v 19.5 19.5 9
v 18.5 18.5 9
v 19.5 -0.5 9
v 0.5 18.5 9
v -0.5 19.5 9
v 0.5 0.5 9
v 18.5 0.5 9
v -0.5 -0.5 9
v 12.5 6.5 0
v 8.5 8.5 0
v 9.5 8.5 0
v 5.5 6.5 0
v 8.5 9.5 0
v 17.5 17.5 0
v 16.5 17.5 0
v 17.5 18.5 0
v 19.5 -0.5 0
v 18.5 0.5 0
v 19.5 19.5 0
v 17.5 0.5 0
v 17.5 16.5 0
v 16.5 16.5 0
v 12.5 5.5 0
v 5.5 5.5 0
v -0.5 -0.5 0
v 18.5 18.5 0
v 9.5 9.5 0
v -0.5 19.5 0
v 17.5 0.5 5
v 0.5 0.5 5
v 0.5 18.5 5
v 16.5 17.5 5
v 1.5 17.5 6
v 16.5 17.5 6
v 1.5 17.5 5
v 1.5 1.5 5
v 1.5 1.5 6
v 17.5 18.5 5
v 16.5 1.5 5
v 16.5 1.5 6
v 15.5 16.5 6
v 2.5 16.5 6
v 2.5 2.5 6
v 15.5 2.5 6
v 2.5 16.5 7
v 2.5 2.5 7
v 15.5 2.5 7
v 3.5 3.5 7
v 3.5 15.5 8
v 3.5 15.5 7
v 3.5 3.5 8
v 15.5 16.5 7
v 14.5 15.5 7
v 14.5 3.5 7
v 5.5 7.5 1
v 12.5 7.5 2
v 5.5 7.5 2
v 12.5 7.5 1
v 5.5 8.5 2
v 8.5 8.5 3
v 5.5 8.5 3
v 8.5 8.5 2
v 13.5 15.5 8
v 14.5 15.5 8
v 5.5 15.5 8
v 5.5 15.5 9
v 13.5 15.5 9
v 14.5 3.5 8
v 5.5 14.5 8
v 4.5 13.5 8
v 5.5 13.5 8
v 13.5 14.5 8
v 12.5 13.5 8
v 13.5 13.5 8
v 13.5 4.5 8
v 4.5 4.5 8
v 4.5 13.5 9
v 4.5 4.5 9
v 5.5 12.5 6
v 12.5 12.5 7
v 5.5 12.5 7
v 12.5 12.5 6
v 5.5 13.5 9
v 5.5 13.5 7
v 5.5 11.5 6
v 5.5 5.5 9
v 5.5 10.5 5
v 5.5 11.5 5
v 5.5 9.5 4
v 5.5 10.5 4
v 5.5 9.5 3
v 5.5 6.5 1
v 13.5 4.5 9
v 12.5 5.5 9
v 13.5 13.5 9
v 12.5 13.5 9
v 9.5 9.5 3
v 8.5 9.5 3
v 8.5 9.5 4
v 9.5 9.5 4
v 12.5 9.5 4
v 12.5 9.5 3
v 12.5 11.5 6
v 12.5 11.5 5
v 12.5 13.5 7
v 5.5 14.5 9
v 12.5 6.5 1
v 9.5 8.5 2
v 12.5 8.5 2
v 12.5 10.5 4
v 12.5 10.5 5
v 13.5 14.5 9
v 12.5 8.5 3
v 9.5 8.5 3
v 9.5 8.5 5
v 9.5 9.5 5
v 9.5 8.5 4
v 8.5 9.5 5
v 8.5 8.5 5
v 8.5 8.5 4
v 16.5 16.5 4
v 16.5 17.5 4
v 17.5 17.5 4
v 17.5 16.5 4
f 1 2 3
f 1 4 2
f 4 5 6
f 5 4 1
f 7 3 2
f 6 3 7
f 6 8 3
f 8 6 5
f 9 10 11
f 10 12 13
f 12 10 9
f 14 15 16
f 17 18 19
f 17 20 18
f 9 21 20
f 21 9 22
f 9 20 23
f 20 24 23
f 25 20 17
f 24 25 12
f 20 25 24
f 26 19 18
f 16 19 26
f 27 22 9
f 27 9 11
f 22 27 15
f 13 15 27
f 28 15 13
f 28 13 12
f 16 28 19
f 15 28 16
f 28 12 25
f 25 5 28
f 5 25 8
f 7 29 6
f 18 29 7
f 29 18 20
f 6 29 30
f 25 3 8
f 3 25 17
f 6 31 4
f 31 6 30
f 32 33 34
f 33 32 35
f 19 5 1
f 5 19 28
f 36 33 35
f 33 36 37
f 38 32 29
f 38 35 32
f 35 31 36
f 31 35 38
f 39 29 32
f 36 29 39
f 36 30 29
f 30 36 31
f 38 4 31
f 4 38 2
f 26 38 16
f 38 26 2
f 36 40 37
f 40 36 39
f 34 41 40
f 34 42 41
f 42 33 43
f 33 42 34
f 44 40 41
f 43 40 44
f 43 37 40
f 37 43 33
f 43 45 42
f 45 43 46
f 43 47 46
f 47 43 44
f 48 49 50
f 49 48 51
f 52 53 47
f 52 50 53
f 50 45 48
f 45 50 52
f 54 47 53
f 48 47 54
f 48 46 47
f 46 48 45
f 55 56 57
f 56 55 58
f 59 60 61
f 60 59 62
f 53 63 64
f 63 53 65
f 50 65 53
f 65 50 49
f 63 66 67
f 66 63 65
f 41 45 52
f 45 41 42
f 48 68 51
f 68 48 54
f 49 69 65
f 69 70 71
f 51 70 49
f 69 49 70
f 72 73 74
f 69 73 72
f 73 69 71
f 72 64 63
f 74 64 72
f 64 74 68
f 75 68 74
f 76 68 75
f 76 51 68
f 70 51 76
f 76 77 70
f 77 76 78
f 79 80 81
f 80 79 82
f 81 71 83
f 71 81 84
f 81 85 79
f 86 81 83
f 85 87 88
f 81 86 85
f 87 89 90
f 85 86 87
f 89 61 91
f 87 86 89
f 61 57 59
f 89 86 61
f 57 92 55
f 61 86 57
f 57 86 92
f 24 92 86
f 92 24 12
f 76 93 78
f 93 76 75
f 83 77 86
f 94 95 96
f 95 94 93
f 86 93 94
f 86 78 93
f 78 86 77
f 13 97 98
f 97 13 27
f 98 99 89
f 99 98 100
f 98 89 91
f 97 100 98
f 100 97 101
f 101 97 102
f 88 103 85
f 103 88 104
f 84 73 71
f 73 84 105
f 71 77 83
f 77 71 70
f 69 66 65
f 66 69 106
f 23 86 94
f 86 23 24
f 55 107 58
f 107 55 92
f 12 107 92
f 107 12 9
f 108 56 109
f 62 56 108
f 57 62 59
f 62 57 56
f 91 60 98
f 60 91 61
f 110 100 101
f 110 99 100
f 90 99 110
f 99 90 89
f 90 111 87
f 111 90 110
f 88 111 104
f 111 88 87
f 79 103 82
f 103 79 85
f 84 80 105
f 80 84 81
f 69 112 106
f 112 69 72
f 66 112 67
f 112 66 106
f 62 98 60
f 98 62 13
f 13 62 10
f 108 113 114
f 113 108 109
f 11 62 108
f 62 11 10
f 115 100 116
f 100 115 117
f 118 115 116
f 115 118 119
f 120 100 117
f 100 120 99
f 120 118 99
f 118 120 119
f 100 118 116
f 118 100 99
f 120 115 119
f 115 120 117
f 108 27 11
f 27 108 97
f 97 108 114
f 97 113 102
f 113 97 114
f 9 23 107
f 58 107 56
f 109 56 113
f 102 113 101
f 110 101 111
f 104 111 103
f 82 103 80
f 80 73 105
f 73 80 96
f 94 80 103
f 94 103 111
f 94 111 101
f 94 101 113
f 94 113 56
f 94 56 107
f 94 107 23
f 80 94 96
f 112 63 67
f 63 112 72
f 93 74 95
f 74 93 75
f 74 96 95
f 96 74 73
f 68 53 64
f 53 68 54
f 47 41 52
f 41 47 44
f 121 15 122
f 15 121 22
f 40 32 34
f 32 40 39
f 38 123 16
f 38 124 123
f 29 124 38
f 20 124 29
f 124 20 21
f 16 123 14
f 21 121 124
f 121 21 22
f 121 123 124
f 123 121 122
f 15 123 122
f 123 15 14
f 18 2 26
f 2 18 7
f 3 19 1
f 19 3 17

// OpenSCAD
union() {
    translate([0, 0, 4.5]) cube([1, 1, 9], center=true);
    translate([0, 1, 4.5]) cube([1, 1, 9], center=true);
    translate([0, 2, 4.5]) cube([1, 1, 9], center=true);
    translate([0, 3, 4.5]) cube([1, 1, 9], center=true);
    translate([0, 4, 4.5]) cube([1, 1, 9], center=true);
    translate([0, 5, 4.5]) cube([1, 1, 9], center=true);
    translate([0, 6, 4.5]) cube([1, 1, 9], center=true);
    translate([0, 7, 4.5]) cube([1, 1, 9], center=true);
    translate([0, 8, 4.5]) cube([1, 1, 9], center=true);
    translate([0, 9, 4.5]) cube([1, 1, 9], center=true);
    translate([0, 10, 4.5]) cube([1, 1, 9], center=true);
    translate([0, 11, 4.5]) cube([1, 1, 9], center=true);
    translate([0, 12, 4.5]) cube([1, 1, 9], center=true);
    translate([0, 13, 4.5]) cube([1, 1, 9], center=true);
    translate([0, 14, 4.5]) cube([1, 1, 9], center=true);
    translate([0, 15, 4.5]) cube([1, 1, 9], center=true);
    translate([0, 16, 4.5]) cube([1, 1, 9], center=true);
    translate([0, 17, 4.5]) cube([1, 1, 9], center=true);
    translate([0, 18, 4.5]) cube([1, 1, 9], center=true);
    translate([0, 19, 4.5]) cube([1, 1, 9], center=true);
    translate([1, 0, 4.5]) cube([1, 1, 9], center=true);
    translate([1, 1, 2.5]) cube([1, 1, 5], center=true);
    translate([1, 2, 2.5]) cube([1, 1, 5], center=true);
    translate([1, 3, 2.5]) cube([1, 1, 5], center=true);
    translate([1, 4, 2.5]) cube([1, 1, 5], center=true);
    translate([1, 5, 2.5]) cube([1, 1, 5], center=true);
    translate([1, 6, 2.5]) cube([1, 1, 5], center=true);
    translate([1, 7, 2.5]) cube([1, 1, 5], center=true);
    translate([1, 8, 2.5]) cube([1, 1, 5], center=true);
    translate([1, 9, 2.5]) cube([1, 1, 5], center=true);
    translate([1, 10, 2.5]) cube([1, 1, 5], center=true);
    translate([1, 11, 2.5]) cube([1, 1, 5], center=true);
    translate([1, 12, 2.5]) cube([1, 1, 5], center=true);
    translate([1, 13, 2.5]) cube([1, 1, 5], center=true);
    translate([1, 14, 2.5]) cube([1, 1, 5], center=true);
    translate([1, 15, 2.5]) cube([1, 1, 5], center=true);
    translate([1, 16, 2.5]) cube([1, 1, 5], center=true);
    translate([1, 17, 2.5]) cube([1, 1, 5], center=true);
    translate([1, 18, 2.5]) cube([1, 1, 5], center=true);
    translate([1, 19, 4.5]) cube([1, 1, 9], center=true);
    translate([2, 0, 4.5]) cube([1, 1, 9], center=true);
    translate([2, 1, 2.5]) cube([1, 1, 5], center=true);
    translate([2, 2, 3.0]) cube([1, 1, 6], center=true);
    translate([2, 3, 3.0]) cube([1, 1, 6], center=true);
    translate([2, 4, 3.0]) cube([1, 1, 6], center=true);
    translate([2, 5, 3.0]) cube([1, 1, 6], center=true);
    translate([2, 6, 3.0]) cube([1, 1, 6], center=true);
    translate([2, 7, 3.0]) cube([1, 1, 6], center=true);
    translate([2, 8, 3.0]) cube([1, 1, 6], center=true);
    translate([2, 9, 3.0]) cube([1, 1, 6], center=true);
    translate([2, 10, 3.0]) cube([1, 1, 6], center=true);
    translate([2, 11, 3.0]) cube([1, 1, 6], center=true);
    translate([2, 12, 3.0]) cube([1, 1, 6], center=true);
    translate([2, 13, 3.0]) cube([1, 1, 6], center=true);
    translate([2, 14, 3.0]) cube([1, 1, 6], center=true);
    translate([2, 15, 3.0]) cube([1, 1, 6], center=true);
    translate([2, 16, 3.0]) cube([1, 1, 6], center=true);
    translate([2, 17, 3.0]) cube([1, 1, 6], center=true);
    translate([2, 18, 2.5]) cube([1, 1, 5], center=true);
    translate([2, 19, 4.5]) cube([1, 1, 9], center=true);
    translate([3, 0, 4.5]) cube([1, 1, 9], center=true);
    translate([3, 1, 2.5]) cube([1, 1, 5], center=true);
    translate([3, 2, 3.0]) cube([1, 1, 6], center=true);
    translate([3, 3, 3.5]) cube([1, 1, 7], center=true);
    translate([3, 4, 3.5]) cube([1, 1, 7], center=true);
    translate([3, 5, 3.5]) cube([1, 1, 7], center=true);
    translate([3, 6, 3.5]) cube([1, 1, 7], center=true);
    translate([3, 7, 3.5]) cube([1, 1, 7], center=true);
    translate([3, 8, 3.5]) cube([1, 1, 7], center=true);
    translate([3, 9, 3.5]) cube([1, 1, 7], center=true);
    translate([3, 10, 3.5]) cube([1, 1, 7], center=true);
    translate([3, 11, 3.5]) cube([1, 1, 7], center=true);
    translate([3, 12, 3.5]) cube([1, 1, 7], center=true);
    translate([3, 13, 3.5]) cube([1, 1, 7], center=true);
    translate([3, 14, 3.5]) cube([1, 1, 7], center=true);
    translate([3, 15, 3.5]) cube([1, 1, 7], center=true);
    translate([3, 16, 3.5]) cube([1, 1, 7], center=true);
    translate([3, 17, 3.0]) cube([1, 1, 6], center=true);
    translate([3, 18, 2.5]) cube([1, 1, 5], center=true);
    translate([3, 19, 4.5]) cube([1, 1, 9], center=true);
    translate([4, 0, 4.5]) cube([1, 1, 9], center=true);
    translate([4, 1, 2.5]) cube([1, 1, 5], center=true);
    translate([4, 2, 3.0]) cube([1, 1, 6], center=true);
    translate([4, 3, 3.5]) cube([1, 1, 7], center=true);
    translate([4, 4, 4.0]) cube([1, 1, 8], center=true);
    translate([4, 5, 4.0]) cube([1, 1, 8], center=true);
    translate([4, 6, 4.0]) cube([1, 1, 8], center=true);
    translate([4, 7, 4.0]) cube([1, 1, 8], center=true);
    translate([4, 8, 4.0]) cube([1, 1, 8], center=true);
    translate([4, 9, 4.0]) cube([1, 1, 8], center=true);
    translate([4, 10, 4.0]) cube([1, 1, 8], center=true);
    translate([4, 11, 4.0]) cube([1, 1, 8], center=true);
    translate([4, 12, 4.0]) cube([1, 1, 8], center=true);
    translate([4, 13, 4.0]) cube([1, 1, 8], center=true);
    translate([4, 14, 4.0]) cube([1, 1, 8], center=true);
    translate([4, 15, 4.0]) cube([1, 1, 8], center=true);
    translate([4, 16, 3.5]) cube([1, 1, 7], center=true);
    translate([4, 17, 3.0]) cube([1, 1, 6], center=true);
    translate([4, 18, 2.5]) cube([1, 1, 5], center=true);
    translate([4, 19, 4.5]) cube([1, 1, 9], center=true);
    translate([5, 0, 4.5]) cube([1, 1, 9], center=true);
    translate([5, 1, 2.5]) cube([1, 1, 5], center=true);
    translate([5, 2, 3.0]) cube([1, 1, 6], center=true);
    translate([5, 3, 3.5]) cube([1, 1, 7], center=true);
    translate([5, 4, 4.0]) cube([1, 1, 8], center=true);
    translate([5, 5, 4.5]) cube([1, 1, 9], center=true);
    translate([5, 6, 4.5]) cube([1, 1, 9], center=true);
    translate([5, 7, 4.5]) cube([1, 1, 9], center=true);
    translate([5, 8, 4.5]) cube([1, 1, 9], center=true);
    translate([5, 9, 4.5]) cube([1, 1, 9], center=true);
    translate([5, 10, 4.5]) cube([1, 1, 9], center=true);
    translate([5, 11, 4.5]) cube([1, 1, 9], center=true);
    translate([5, 12, 4.5]) cube([1, 1, 9], center=true);
    translate([5, 13, 4.5]) cube([1, 1, 9], center=true);
    translate([5, 14, 4.0]) cube([1, 1, 8], center=true);
    translate([5, 15, 4.0]) cube([1, 1, 8], center=true);
    translate([5, 16, 3.5]) cube([1, 1, 7], center=true);
    translate([5, 17, 3.0]) cube([1, 1, 6], center=true);
    translate([5, 18, 2.5]) cube([1, 1, 5], center=true);
    translate([5, 19, 4.5]) cube([1, 1, 9], center=true);
    translate([6, 0, 4.5]) cube([1, 1, 9], center=true);
    translate([6, 1, 2.5]) cube([1, 1, 5], center=true);
    translate([6, 2, 3.0]) cube([1, 1, 6], center=true);
    translate([6, 3, 3.5]) cube([1, 1, 7], center=true);
    translate([6, 4, 4.0]) cube([1, 1, 8], center=true);
    translate([6, 5, 4.5]) cube([1, 1, 9], center=true);
    translate([6, 7, 0.5]) cube([1, 1, 1], center=true);
    translate([6, 8, 1.0]) cube([1, 1, 2], center=true);
    translate([6, 9, 1.5]) cube([1, 1, 3], center=true);
    translate([6, 10, 2.0]) cube([1, 1, 4], center=true);
    translate([6, 11, 2.5]) cube([1, 1, 5], center=true);
    translate([6, 12, 3.0]) cube([1, 1, 6], center=true);
    translate([6, 13, 3.5]) cube([1, 1, 7], center=true);
    translate([6, 14, 4.0]) cube([1, 1, 8], center=true);
    translate([6, 15, 4.5]) cube([1, 1, 9], center=true);
    translate([6, 16, 3.5]) cube([1, 1, 7], center=true);
    translate([6, 17, 3.0]) cube([1, 1, 6], center=true);
    translate([6, 18, 2.5]) cube([1, 1, 5], center=true);
    translate([6, 19, 4.5]) cube([1, 1, 9], center=true);
    translate([7, 0, 4.5]) cube([1, 1, 9], center=true);
    translate([7, 1, 2.5]) cube([1, 1, 5], center=true);
    translate([7, 2, 3.0]) cube([1, 1, 6], center=true);
    translate([7, 3, 3.5]) cube([1, 1, 7], center=true);
    translate([7, 4, 4.0]) cube([1, 1, 8], center=true);
    translate([7, 5, 4.5]) cube([1, 1, 9], center=true);
    translate([7, 7, 0.5]) cube([1, 1, 1], center=true);
    translate([7, 8, 1.0]) cube([1, 1, 2], center=true);
    translate([7, 9, 1.5]) cube([1, 1, 3], center=true);
    translate([7, 10, 2.0]) cube([1, 1, 4], center=true);
    translate([7, 11, 2.5]) cube([1, 1, 5], center=true);
    translate([7, 12, 3.0]) cube([1, 1, 6], center=true);
    translate([7, 13, 3.5]) cube([1, 1, 7], center=true);
    translate([7, 14, 4.0]) cube([1, 1, 8], center=true);
    translate([7, 15, 4.5]) cube([1, 1, 9], center=true);
    translate([7, 16, 3.5]) cube([1, 1, 7], center=true);
    translate([7, 17, 3.0]) cube([1, 1, 6], center=true);
    translate([7, 18, 2.5]) cube([1, 1, 5], center=true);
    translate([7, 19, 4.5]) cube([1, 1, 9], center=true);
    translate([8, 0, 4.5]) cube([1, 1, 9], center=true);
    translate([8, 1, 2.5]) cube([1, 1, 5], center=true);
    translate([8, 2, 3.0]) cube([1, 1, 6], center=true);
    translate([8, 3, 3.5]) cube([1, 1, 7], center=true);
    translate([8, 4, 4.0]) cube([1, 1, 8], center=true);
    translate([8, 5, 4.5]) cube([1, 1, 9], center=true);
    translate([8, 7, 0.5]) cube([1, 1, 1], center=true);
    translate([8, 8, 1.0]) cube([1, 1, 2], center=true);
    translate([8, 9, 1.5]) cube([1, 1, 3], center=true);
    translate([8, 10, 2.0]) cube([1, 1, 4], center=true);
    translate([8, 11, 2.5]) cube([1, 1, 5], center=true);
    translate([8, 12, 3.0]) cube([1, 1, 6], center=true);
    translate([8, 13, 3.5]) cube([1, 1, 7], center=true);
    translate([8, 14, 4.0]) cube([1, 1, 8], center=true);
    translate([8, 15, 4.5]) cube([1, 1, 9], center=true);
    translate([8, 16, 3.5]) cube([1, 1, 7], center=true);
    translate([8, 17, 3.0]) cube([1, 1, 6], center=true);
    translate([8, 18, 2.5]) cube([1, 1, 5], center=true);
    translate([8, 19, 4.5]) cube([1, 1, 9], center=true);
    translate([9, 0, 4.5]) cube([1, 1, 9], center=true);
    translate([9, 1, 2.5]) cube([1, 1, 5], center=true);
    translate([9, 2, 3.0]) cube([1, 1, 6], center=true);
    translate([9, 3, 3.5]) cube([1, 1, 7], center=true);
    translate([9, 4, 4.0]) cube([1, 1, 8], center=true);
    translate([9, 5, 4.5]) cube([1, 1, 9], center=true);
    translate([9, 7, 0.5]) cube([1, 1, 1], center=true);
    translate([9, 8, 1.0]) cube([1, 1, 2], center=true);
    translate([9, 9, 4.5]) color([1, 0, 0]) cube([1, 1, 1], center=true);
    translate([9, 10, 2.0]) cube([1, 1, 4], center=true);
    translate([9, 11, 2.5]) cube([1, 1, 5], center=true);
    translate([9, 12, 3.0]) cube([1, 1, 6], center=true);
    translate([9, 13, 3.5]) cube([1, 1, 7], center=true);
    translate([9, 14, 4.0]) cube([1, 1, 8], center=true);
    translate([9, 15, 4.5]) cube([1, 1, 9], center=true);
    translate([9, 16, 3.5]) cube([1, 1, 7], center=true);
    translate([9, 17, 3.0]) cube([1, 1, 6], center=true);
    translate([9, 18, 2.5]) cube([1, 1, 5], center=true);
    translate([9, 19, 4.5]) cube([1, 1, 9], center=true);
    translate([10, 0, 4.5]) cube([1, 1, 9], center=true);
    translate([10, 1, 2.5]) cube([1, 1, 5], center=true);
    translate([10, 2, 3.0]) cube([1, 1, 6], center=true);
    translate([10, 3, 3.5]) cube([1, 1, 7], center=true);
    translate([10, 4, 4.0]) cube([1, 1, 8], center=true);
    translate([10, 5, 4.5]) cube([1, 1, 9], center=true);
    translate([10, 7, 0.5]) cube([1, 1, 1], center=true);
    translate([10, 8, 1.0]) cube([1, 1, 2], center=true);
    translate([10, 9, 1.5]) cube([1, 1, 3], center=true);
    translate([10, 10, 2.0]) cube([1, 1, 4], center=true);
    translate([10, 11, 2.5]) cube([1, 1, 5], center=true);
    translate([10, 12, 3.0]) cube([1, 1, 6], center=true);
    translate([10, 13, 3.5]) cube([1, 1, 7], center=true);
    translate([10, 14, 4.0]) cube([1, 1, 8], center=true);
    translate([10, 15, 4.5]) cube([1, 1, 9], center=true);
    translate([10, 16, 3.5]) cube([1, 1, 7], center=true);
    translate([10, 17, 3.0]) cube([1, 1, 6], center=true);
    translate([10, 18, 2.5]) cube([1, 1, 5], center=true);
    translate([10, 19, 4.5]) cube([1, 1, 9], center=true);
    translate([11, 0, 4.5]) cube([1, 1, 9], center=true);
    translate([11, 1, 2.5]) cube([1, 1, 5], center=true);
    translate([11, 2, 3.0]) cube([1, 1, 6], center=true);
    translate([11, 3, 3.5]) cube([1, 1, 7], center=true);
    translate([11, 4, 4.0]) cube([1, 1, 8], center=true);
    translate([11, 5, 4.5]) cube([1, 1, 9], center=true);
    translate([11, 7, 0.5]) cube([1, 1, 1], center=true);
    translate([11, 8, 1.0]) cube([1, 1, 2], center=true);
    translate([11, 9, 1.5]) cube([1, 1, 3], center=true);
    translate([11, 10, 2.0]) cube([1, 1, 4], center=true);
    translate([11, 11, 2.5]) cube([1, 1, 5], center=true);
    translate([11, 12, 3.0]) cube([1, 1, 6], center=true);
    translate([11, 13, 3.5]) cube([1, 1, 7], center=true);
    translate([11, 14, 4.0]) cube([1, 1, 8], center=true);
    translate([11, 15, 4.5]) cube([1, 1, 9], center=true);
    translate([11, 16, 3.5]) cube([1, 1, 7], center=true);
    translate([11, 17, 3.0]) cube([1, 1, 6], center=true);
    translate([11, 18, 2.5]) cube([1, 1, 5], center=true);
    translate([11, 19, 4.5]) cube([1, 1, 9], center=true);
    translate([12, 0, 4.5]) cube([1, 1, 9], center=true);
    translate([12, 1, 2.5]) cube([1, 1, 5], center=true);
    translate([12, 2, 3.0]) cube([1, 1, 6], center=true);
    translate([12, 3, 3.5]) cube([1, 1, 7], center=true);
    translate([12, 4, 4.0]) cube([1, 1, 8], center=true);
    translate([12, 5, 4.5]) cube([1, 1, 9], center=true);
    translate([12, 7, 0.5]) cube([1, 1, 1], center=true);
    translate([12, 8, 1.0]) cube([1, 1, 2], center=true);
    translate([12, 9, 1.5]) cube([1, 1, 3], center=true);
    translate([12, 10, 2.0]) cube([1, 1, 4], center=true);
    translate([12, 11, 2.5]) cube([1, 1, 5], center=true);
    translate([12, 12, 3.0]) cube([1, 1, 6], center=true);
    translate([12, 13, 3.5]) cube([1, 1, 7], center=true);
    translate([12, 14, 4.0]) cube([1, 1, 8], center=true);
    translate([12, 15, 4.5]) cube([1, 1, 9], center=true);
    translate([12, 16, 3.5]) cube([1, 1, 7], center=true);
    translate([12, 17, 3.0]) cube([1, 1, 6], center=true);
    translate([12, 18, 2.5]) cube([1, 1, 5], center=true);
    translate([12, 19, 4.5]) cube([1, 1, 9], center=true);
    translate([13, 0, 4.5]) cube([1, 1, 9], center=true);
    translate([13, 1, 2.5]) cube([1, 1, 5], center=true);
    translate([13, 2, 3.0]) cube([1, 1, 6], center=true);
    translate([13, 3, 3.5]) cube([1, 1, 7], center=true);
    translate([13, 4, 4.0]) cube([1, 1, 8], center=true);
    translate([13, 5, 4.5]) cube([1, 1, 9], center=true);
    translate([13, 6, 4.5]) cube([1, 1, 9], center=true);
    translate([13, 7, 4.5]) cube([1, 1, 9], center=true);
    translate([13, 8, 4.5]) cube([1, 1, 9], center=true);
    translate([13, 9, 4.5]) cube([1, 1, 9], center=true);
    translate([13, 10, 4.5]) cube([1, 1, 9], center=true);
    translate([13, 11, 4.5]) cube([1, 1, 9], center=true);
    translate([13, 12, 4.5]) cube([1, 1, 9], center=true);
    translate([13, 13, 4.5]) cube([1, 1, 9], center=true);
    translate([13, 14, 4.0]) cube([1, 1, 8], center=true);
    translate([13, 15, 4.5]) cube([1, 1, 9], center=true);
    translate([13, 16, 3.5]) cube([1, 1, 7], center=true);
    translate([13, 17, 3.0]) cube([1, 1, 6], center=true);
    translate([13, 18, 2.5]) cube([1, 1, 5], center=true);
    translate([13, 19, 4.5]) cube([1, 1, 9], center=true);
    translate([14, 0, 4.5]) cube([1, 1, 9], center=true);
    translate([14, 1, 2.5]) cube([1, 1, 5], center=true);
    translate([14, 2, 3.0]) cube([1, 1, 6], center=true);
    translate([14, 3, 3.5]) cube([1, 1, 7], center=true);
    translate([14, 4, 4.0]) cube([1, 1, 8], center=true);
    translate([14, 5, 4.0]) cube([1, 1, 8], center=true);
    translate([14, 6, 4.0]) cube([1, 1, 8], center=true);
    translate([14, 7, 4.0]) cube([1, 1, 8], center=true);
    translate([14, 8, 4.0]) cube([1, 1, 8], center=true);
    translate([14, 9, 4.0]) cube([1, 1, 8], center=true);
    translate([14, 10, 4.0]) cube([1, 1, 8], center=true);
    translate([14, 11, 4.0]) cube([1, 1, 8], center=true);
    translate([14, 12, 4.0]) cube([1, 1, 8], center=true);
    translate([14, 13, 4.0]) cube([1, 1, 8], center=true);
    translate([14, 14, 4.0]) cube([1, 1, 8], center=true);
    translate([14, 15, 4.0]) cube([1, 1, 8], center=true);
    translate([14, 16, 3.5]) cube([1, 1, 7], center=true);
    translate([14, 17, 3.0]) cube([1, 1, 6], center=true);
    translate([14, 18, 2.5]) cube([1, 1, 5], center=true);
    translate([14, 19, 4.5]) cube([1, 1, 9], center=true);
    translate([15, 0, 4.5]) cube([1, 1, 9], center=true);
    translate([15, 1, 2.5]) cube([1, 1, 5], center=true);
    translate([15, 2, 3.0]) cube([1, 1, 6], center=true);
    translate([15, 3, 3.5]) cube([1, 1, 7], center=true);
    translate([15, 4, 3.5]) cube([1, 1, 7], center=true);
    translate([15, 5, 3.5]) cube([1, 1, 7], center=true);
    translate([15, 6, 3.5]) cube([1, 1, 7], center=true);
    translate([15, 7, 3.5]) cube([1, 1, 7], center=true);
    translate([15, 8, 3.5]) cube([1, 1, 7], center=true);
    translate([15, 9, 3.5]) cube([1, 1, 7], center=true);
    translate([15, 10, 3.5]) cube([1, 1, 7], center=true);
    translate([15, 11, 3.5]) cube([1, 1, 7], center=true);
    translate([15, 12, 3.5]) cube([1, 1, 7], center=true);
    translate([15, 13, 3.5]) cube([1, 1, 7], center=true);
    translate([15, 14, 3.5]) cube([1, 1, 7], center=true);
    translate([15, 15, 3.5]) cube([1, 1, 7], center=true);
    translate([15, 16, 3.5]) cube([1, 1, 7], center=true);
    translate([15, 17, 3.0]) cube([1, 1, 6], center=true);
    translate([15, 18, 2.5]) cube([1, 1, 5], center=true);
    translate([15, 19, 4.5]) cube([1, 1, 9], center=true);
    translate([16, 0, 4.5]) cube([1, 1, 9], center=true);
    translate([16, 1, 2.5]) cube([1, 1, 5], center=true);
    translate([16, 2, 3.0]) cube([1, 1, 6], center=true);
    translate([16, 3, 3.0]) cube([1, 1, 6], center=true);
    translate([16, 4, 3.0]) cube([1, 1, 6], center=true);
    translate([16, 5, 3.0]) cube([1, 1, 6], center=true);
    translate([16, 6, 3.0]) cube([1, 1, 6], center=true);
    translate([16, 7, 3.0]) cube([1, 1, 6], center=true);
    translate([16, 8, 3.0]) cube([1, 1, 6], center=true);
    translate([16, 9, 3.0]) cube([1, 1, 6], center=true);
    translate([16, 10, 3.0]) cube([1, 1, 6], center=true);
    translate([16, 11, 3.0]) cube([1, 1, 6], center=true);
    translate([16, 12, 3.0]) cube([1, 1, 6], center=true);
    translate([16, 13, 3.0]) cube([1, 1, 6], center=true);
    translate([16, 14, 3.0]) cube([1, 1, 6], center=true);
    translate([16, 15, 3.0]) cube([1, 1, 6], center=true);
    translate([16, 16, 3.0]) cube([1, 1, 6], center=true);
    translate([16, 17, 3.0]) cube([1, 1, 6], center=true);
    translate([16, 18, 2.5]) cube([1, 1, 5], center=true);
    translate([16, 19, 4.5]) cube([1, 1, 9], center=true);
    translate([17, 0, 4.5]) cube([1, 1, 9], center=true);
    translate([17, 1, 2.5]) cube([1, 1, 5], center=true);
    translate([17, 2, 2.5]) cube([1, 1, 5], center=true);
    translate([17, 3, 2.5]) cube([1, 1, 5], center=true);
    translate([17, 4, 2.5]) cube([1, 1, 5], center=true);
    translate([17, 5, 2.5]) cube([1, 1, 5], center=true);
    translate([17, 6, 2.5]) cube([1, 1, 5], center=true);
    translate([17, 7, 2.5]) cube([1, 1, 5], center=true);
    translate([17, 8, 2.5]) cube([1, 1, 5], center=true);
    translate([17, 9, 2.5]) cube([1, 1, 5], center=true);
    translate([17, 10, 2.5]) cube([1, 1, 5], center=true);
    translate([17, 11, 2.5]) cube([1, 1, 5], center=true);
    translate([17, 12, 2.5]) cube([1, 1, 5], center=true);
    translate([17, 13, 2.5]) cube([1, 1, 5], center=true);
    translate([17, 14, 2.5]) cube([1, 1, 5], center=true);
    translate([17, 15, 2.5]) cube([1, 1, 5], center=true);
    translate([17, 16, 2.5]) cube([1, 1, 5], center=true);
    translate([17, 17, 4.5]) color([0, 0, 1]) cube([1, 1, 1], center=true);
    translate([17, 18, 2.5]) cube([1, 1, 5], center=true);
    translate([17, 19, 4.5]) cube([1, 1, 9], center=true);
    translate([18, 0, 4.5]) cube([1, 1, 9], center=true);
    translate([18, 19, 4.5]) cube([1, 1, 9], center=true);
    translate([19, 0, 4.5]) cube([1, 1, 9], center=true);
    translate([19, 1, 4.5]) cube([1, 1, 9], center=true);
    translate([19, 2, 4.5]) cube([1, 1, 9], center=true);
    translate([19, 3, 4.5]) cube([1, 1, 9], center=true);
    translate([19, 4, 4.5]) cube([1, 1, 9], center=true);
    translate([19, 5, 4.5]) cube([1, 1, 9], center=true);
    translate([19, 6, 4.5]) cube([1, 1, 9], center=true);
    translate([19, 7, 4.5]) cube([1, 1, 9], center=true);
    translate([19, 8, 4.5]) cube([1, 1, 9], center=true);
    translate([19, 9, 4.5]) cube([1, 1, 9], center=true);
    translate([19, 10, 4.5]) cube([1, 1, 9], center=true);
    translate([19, 11, 4.5]) cube([1, 1, 9], center=true);
    translate([19, 12, 4.5]) cube([1, 1, 9], center=true);
    translate([19, 13, 4.5]) cube([1, 1, 9], center=true);
    translate([19, 14, 4.5]) cube([1, 1, 9], center=true);
    translate([19, 15, 4.5]) cube([1, 1, 9], center=true);
    translate([19, 16, 4.5]) cube([1, 1, 9], center=true);
    translate([19, 17, 4.5]) cube([1, 1, 9], center=true);
    translate([19, 18, 4.5]) cube([1, 1, 9], center=true);
    translate([19, 19, 4.5]) cube([1, 1, 9], center=true);
}
